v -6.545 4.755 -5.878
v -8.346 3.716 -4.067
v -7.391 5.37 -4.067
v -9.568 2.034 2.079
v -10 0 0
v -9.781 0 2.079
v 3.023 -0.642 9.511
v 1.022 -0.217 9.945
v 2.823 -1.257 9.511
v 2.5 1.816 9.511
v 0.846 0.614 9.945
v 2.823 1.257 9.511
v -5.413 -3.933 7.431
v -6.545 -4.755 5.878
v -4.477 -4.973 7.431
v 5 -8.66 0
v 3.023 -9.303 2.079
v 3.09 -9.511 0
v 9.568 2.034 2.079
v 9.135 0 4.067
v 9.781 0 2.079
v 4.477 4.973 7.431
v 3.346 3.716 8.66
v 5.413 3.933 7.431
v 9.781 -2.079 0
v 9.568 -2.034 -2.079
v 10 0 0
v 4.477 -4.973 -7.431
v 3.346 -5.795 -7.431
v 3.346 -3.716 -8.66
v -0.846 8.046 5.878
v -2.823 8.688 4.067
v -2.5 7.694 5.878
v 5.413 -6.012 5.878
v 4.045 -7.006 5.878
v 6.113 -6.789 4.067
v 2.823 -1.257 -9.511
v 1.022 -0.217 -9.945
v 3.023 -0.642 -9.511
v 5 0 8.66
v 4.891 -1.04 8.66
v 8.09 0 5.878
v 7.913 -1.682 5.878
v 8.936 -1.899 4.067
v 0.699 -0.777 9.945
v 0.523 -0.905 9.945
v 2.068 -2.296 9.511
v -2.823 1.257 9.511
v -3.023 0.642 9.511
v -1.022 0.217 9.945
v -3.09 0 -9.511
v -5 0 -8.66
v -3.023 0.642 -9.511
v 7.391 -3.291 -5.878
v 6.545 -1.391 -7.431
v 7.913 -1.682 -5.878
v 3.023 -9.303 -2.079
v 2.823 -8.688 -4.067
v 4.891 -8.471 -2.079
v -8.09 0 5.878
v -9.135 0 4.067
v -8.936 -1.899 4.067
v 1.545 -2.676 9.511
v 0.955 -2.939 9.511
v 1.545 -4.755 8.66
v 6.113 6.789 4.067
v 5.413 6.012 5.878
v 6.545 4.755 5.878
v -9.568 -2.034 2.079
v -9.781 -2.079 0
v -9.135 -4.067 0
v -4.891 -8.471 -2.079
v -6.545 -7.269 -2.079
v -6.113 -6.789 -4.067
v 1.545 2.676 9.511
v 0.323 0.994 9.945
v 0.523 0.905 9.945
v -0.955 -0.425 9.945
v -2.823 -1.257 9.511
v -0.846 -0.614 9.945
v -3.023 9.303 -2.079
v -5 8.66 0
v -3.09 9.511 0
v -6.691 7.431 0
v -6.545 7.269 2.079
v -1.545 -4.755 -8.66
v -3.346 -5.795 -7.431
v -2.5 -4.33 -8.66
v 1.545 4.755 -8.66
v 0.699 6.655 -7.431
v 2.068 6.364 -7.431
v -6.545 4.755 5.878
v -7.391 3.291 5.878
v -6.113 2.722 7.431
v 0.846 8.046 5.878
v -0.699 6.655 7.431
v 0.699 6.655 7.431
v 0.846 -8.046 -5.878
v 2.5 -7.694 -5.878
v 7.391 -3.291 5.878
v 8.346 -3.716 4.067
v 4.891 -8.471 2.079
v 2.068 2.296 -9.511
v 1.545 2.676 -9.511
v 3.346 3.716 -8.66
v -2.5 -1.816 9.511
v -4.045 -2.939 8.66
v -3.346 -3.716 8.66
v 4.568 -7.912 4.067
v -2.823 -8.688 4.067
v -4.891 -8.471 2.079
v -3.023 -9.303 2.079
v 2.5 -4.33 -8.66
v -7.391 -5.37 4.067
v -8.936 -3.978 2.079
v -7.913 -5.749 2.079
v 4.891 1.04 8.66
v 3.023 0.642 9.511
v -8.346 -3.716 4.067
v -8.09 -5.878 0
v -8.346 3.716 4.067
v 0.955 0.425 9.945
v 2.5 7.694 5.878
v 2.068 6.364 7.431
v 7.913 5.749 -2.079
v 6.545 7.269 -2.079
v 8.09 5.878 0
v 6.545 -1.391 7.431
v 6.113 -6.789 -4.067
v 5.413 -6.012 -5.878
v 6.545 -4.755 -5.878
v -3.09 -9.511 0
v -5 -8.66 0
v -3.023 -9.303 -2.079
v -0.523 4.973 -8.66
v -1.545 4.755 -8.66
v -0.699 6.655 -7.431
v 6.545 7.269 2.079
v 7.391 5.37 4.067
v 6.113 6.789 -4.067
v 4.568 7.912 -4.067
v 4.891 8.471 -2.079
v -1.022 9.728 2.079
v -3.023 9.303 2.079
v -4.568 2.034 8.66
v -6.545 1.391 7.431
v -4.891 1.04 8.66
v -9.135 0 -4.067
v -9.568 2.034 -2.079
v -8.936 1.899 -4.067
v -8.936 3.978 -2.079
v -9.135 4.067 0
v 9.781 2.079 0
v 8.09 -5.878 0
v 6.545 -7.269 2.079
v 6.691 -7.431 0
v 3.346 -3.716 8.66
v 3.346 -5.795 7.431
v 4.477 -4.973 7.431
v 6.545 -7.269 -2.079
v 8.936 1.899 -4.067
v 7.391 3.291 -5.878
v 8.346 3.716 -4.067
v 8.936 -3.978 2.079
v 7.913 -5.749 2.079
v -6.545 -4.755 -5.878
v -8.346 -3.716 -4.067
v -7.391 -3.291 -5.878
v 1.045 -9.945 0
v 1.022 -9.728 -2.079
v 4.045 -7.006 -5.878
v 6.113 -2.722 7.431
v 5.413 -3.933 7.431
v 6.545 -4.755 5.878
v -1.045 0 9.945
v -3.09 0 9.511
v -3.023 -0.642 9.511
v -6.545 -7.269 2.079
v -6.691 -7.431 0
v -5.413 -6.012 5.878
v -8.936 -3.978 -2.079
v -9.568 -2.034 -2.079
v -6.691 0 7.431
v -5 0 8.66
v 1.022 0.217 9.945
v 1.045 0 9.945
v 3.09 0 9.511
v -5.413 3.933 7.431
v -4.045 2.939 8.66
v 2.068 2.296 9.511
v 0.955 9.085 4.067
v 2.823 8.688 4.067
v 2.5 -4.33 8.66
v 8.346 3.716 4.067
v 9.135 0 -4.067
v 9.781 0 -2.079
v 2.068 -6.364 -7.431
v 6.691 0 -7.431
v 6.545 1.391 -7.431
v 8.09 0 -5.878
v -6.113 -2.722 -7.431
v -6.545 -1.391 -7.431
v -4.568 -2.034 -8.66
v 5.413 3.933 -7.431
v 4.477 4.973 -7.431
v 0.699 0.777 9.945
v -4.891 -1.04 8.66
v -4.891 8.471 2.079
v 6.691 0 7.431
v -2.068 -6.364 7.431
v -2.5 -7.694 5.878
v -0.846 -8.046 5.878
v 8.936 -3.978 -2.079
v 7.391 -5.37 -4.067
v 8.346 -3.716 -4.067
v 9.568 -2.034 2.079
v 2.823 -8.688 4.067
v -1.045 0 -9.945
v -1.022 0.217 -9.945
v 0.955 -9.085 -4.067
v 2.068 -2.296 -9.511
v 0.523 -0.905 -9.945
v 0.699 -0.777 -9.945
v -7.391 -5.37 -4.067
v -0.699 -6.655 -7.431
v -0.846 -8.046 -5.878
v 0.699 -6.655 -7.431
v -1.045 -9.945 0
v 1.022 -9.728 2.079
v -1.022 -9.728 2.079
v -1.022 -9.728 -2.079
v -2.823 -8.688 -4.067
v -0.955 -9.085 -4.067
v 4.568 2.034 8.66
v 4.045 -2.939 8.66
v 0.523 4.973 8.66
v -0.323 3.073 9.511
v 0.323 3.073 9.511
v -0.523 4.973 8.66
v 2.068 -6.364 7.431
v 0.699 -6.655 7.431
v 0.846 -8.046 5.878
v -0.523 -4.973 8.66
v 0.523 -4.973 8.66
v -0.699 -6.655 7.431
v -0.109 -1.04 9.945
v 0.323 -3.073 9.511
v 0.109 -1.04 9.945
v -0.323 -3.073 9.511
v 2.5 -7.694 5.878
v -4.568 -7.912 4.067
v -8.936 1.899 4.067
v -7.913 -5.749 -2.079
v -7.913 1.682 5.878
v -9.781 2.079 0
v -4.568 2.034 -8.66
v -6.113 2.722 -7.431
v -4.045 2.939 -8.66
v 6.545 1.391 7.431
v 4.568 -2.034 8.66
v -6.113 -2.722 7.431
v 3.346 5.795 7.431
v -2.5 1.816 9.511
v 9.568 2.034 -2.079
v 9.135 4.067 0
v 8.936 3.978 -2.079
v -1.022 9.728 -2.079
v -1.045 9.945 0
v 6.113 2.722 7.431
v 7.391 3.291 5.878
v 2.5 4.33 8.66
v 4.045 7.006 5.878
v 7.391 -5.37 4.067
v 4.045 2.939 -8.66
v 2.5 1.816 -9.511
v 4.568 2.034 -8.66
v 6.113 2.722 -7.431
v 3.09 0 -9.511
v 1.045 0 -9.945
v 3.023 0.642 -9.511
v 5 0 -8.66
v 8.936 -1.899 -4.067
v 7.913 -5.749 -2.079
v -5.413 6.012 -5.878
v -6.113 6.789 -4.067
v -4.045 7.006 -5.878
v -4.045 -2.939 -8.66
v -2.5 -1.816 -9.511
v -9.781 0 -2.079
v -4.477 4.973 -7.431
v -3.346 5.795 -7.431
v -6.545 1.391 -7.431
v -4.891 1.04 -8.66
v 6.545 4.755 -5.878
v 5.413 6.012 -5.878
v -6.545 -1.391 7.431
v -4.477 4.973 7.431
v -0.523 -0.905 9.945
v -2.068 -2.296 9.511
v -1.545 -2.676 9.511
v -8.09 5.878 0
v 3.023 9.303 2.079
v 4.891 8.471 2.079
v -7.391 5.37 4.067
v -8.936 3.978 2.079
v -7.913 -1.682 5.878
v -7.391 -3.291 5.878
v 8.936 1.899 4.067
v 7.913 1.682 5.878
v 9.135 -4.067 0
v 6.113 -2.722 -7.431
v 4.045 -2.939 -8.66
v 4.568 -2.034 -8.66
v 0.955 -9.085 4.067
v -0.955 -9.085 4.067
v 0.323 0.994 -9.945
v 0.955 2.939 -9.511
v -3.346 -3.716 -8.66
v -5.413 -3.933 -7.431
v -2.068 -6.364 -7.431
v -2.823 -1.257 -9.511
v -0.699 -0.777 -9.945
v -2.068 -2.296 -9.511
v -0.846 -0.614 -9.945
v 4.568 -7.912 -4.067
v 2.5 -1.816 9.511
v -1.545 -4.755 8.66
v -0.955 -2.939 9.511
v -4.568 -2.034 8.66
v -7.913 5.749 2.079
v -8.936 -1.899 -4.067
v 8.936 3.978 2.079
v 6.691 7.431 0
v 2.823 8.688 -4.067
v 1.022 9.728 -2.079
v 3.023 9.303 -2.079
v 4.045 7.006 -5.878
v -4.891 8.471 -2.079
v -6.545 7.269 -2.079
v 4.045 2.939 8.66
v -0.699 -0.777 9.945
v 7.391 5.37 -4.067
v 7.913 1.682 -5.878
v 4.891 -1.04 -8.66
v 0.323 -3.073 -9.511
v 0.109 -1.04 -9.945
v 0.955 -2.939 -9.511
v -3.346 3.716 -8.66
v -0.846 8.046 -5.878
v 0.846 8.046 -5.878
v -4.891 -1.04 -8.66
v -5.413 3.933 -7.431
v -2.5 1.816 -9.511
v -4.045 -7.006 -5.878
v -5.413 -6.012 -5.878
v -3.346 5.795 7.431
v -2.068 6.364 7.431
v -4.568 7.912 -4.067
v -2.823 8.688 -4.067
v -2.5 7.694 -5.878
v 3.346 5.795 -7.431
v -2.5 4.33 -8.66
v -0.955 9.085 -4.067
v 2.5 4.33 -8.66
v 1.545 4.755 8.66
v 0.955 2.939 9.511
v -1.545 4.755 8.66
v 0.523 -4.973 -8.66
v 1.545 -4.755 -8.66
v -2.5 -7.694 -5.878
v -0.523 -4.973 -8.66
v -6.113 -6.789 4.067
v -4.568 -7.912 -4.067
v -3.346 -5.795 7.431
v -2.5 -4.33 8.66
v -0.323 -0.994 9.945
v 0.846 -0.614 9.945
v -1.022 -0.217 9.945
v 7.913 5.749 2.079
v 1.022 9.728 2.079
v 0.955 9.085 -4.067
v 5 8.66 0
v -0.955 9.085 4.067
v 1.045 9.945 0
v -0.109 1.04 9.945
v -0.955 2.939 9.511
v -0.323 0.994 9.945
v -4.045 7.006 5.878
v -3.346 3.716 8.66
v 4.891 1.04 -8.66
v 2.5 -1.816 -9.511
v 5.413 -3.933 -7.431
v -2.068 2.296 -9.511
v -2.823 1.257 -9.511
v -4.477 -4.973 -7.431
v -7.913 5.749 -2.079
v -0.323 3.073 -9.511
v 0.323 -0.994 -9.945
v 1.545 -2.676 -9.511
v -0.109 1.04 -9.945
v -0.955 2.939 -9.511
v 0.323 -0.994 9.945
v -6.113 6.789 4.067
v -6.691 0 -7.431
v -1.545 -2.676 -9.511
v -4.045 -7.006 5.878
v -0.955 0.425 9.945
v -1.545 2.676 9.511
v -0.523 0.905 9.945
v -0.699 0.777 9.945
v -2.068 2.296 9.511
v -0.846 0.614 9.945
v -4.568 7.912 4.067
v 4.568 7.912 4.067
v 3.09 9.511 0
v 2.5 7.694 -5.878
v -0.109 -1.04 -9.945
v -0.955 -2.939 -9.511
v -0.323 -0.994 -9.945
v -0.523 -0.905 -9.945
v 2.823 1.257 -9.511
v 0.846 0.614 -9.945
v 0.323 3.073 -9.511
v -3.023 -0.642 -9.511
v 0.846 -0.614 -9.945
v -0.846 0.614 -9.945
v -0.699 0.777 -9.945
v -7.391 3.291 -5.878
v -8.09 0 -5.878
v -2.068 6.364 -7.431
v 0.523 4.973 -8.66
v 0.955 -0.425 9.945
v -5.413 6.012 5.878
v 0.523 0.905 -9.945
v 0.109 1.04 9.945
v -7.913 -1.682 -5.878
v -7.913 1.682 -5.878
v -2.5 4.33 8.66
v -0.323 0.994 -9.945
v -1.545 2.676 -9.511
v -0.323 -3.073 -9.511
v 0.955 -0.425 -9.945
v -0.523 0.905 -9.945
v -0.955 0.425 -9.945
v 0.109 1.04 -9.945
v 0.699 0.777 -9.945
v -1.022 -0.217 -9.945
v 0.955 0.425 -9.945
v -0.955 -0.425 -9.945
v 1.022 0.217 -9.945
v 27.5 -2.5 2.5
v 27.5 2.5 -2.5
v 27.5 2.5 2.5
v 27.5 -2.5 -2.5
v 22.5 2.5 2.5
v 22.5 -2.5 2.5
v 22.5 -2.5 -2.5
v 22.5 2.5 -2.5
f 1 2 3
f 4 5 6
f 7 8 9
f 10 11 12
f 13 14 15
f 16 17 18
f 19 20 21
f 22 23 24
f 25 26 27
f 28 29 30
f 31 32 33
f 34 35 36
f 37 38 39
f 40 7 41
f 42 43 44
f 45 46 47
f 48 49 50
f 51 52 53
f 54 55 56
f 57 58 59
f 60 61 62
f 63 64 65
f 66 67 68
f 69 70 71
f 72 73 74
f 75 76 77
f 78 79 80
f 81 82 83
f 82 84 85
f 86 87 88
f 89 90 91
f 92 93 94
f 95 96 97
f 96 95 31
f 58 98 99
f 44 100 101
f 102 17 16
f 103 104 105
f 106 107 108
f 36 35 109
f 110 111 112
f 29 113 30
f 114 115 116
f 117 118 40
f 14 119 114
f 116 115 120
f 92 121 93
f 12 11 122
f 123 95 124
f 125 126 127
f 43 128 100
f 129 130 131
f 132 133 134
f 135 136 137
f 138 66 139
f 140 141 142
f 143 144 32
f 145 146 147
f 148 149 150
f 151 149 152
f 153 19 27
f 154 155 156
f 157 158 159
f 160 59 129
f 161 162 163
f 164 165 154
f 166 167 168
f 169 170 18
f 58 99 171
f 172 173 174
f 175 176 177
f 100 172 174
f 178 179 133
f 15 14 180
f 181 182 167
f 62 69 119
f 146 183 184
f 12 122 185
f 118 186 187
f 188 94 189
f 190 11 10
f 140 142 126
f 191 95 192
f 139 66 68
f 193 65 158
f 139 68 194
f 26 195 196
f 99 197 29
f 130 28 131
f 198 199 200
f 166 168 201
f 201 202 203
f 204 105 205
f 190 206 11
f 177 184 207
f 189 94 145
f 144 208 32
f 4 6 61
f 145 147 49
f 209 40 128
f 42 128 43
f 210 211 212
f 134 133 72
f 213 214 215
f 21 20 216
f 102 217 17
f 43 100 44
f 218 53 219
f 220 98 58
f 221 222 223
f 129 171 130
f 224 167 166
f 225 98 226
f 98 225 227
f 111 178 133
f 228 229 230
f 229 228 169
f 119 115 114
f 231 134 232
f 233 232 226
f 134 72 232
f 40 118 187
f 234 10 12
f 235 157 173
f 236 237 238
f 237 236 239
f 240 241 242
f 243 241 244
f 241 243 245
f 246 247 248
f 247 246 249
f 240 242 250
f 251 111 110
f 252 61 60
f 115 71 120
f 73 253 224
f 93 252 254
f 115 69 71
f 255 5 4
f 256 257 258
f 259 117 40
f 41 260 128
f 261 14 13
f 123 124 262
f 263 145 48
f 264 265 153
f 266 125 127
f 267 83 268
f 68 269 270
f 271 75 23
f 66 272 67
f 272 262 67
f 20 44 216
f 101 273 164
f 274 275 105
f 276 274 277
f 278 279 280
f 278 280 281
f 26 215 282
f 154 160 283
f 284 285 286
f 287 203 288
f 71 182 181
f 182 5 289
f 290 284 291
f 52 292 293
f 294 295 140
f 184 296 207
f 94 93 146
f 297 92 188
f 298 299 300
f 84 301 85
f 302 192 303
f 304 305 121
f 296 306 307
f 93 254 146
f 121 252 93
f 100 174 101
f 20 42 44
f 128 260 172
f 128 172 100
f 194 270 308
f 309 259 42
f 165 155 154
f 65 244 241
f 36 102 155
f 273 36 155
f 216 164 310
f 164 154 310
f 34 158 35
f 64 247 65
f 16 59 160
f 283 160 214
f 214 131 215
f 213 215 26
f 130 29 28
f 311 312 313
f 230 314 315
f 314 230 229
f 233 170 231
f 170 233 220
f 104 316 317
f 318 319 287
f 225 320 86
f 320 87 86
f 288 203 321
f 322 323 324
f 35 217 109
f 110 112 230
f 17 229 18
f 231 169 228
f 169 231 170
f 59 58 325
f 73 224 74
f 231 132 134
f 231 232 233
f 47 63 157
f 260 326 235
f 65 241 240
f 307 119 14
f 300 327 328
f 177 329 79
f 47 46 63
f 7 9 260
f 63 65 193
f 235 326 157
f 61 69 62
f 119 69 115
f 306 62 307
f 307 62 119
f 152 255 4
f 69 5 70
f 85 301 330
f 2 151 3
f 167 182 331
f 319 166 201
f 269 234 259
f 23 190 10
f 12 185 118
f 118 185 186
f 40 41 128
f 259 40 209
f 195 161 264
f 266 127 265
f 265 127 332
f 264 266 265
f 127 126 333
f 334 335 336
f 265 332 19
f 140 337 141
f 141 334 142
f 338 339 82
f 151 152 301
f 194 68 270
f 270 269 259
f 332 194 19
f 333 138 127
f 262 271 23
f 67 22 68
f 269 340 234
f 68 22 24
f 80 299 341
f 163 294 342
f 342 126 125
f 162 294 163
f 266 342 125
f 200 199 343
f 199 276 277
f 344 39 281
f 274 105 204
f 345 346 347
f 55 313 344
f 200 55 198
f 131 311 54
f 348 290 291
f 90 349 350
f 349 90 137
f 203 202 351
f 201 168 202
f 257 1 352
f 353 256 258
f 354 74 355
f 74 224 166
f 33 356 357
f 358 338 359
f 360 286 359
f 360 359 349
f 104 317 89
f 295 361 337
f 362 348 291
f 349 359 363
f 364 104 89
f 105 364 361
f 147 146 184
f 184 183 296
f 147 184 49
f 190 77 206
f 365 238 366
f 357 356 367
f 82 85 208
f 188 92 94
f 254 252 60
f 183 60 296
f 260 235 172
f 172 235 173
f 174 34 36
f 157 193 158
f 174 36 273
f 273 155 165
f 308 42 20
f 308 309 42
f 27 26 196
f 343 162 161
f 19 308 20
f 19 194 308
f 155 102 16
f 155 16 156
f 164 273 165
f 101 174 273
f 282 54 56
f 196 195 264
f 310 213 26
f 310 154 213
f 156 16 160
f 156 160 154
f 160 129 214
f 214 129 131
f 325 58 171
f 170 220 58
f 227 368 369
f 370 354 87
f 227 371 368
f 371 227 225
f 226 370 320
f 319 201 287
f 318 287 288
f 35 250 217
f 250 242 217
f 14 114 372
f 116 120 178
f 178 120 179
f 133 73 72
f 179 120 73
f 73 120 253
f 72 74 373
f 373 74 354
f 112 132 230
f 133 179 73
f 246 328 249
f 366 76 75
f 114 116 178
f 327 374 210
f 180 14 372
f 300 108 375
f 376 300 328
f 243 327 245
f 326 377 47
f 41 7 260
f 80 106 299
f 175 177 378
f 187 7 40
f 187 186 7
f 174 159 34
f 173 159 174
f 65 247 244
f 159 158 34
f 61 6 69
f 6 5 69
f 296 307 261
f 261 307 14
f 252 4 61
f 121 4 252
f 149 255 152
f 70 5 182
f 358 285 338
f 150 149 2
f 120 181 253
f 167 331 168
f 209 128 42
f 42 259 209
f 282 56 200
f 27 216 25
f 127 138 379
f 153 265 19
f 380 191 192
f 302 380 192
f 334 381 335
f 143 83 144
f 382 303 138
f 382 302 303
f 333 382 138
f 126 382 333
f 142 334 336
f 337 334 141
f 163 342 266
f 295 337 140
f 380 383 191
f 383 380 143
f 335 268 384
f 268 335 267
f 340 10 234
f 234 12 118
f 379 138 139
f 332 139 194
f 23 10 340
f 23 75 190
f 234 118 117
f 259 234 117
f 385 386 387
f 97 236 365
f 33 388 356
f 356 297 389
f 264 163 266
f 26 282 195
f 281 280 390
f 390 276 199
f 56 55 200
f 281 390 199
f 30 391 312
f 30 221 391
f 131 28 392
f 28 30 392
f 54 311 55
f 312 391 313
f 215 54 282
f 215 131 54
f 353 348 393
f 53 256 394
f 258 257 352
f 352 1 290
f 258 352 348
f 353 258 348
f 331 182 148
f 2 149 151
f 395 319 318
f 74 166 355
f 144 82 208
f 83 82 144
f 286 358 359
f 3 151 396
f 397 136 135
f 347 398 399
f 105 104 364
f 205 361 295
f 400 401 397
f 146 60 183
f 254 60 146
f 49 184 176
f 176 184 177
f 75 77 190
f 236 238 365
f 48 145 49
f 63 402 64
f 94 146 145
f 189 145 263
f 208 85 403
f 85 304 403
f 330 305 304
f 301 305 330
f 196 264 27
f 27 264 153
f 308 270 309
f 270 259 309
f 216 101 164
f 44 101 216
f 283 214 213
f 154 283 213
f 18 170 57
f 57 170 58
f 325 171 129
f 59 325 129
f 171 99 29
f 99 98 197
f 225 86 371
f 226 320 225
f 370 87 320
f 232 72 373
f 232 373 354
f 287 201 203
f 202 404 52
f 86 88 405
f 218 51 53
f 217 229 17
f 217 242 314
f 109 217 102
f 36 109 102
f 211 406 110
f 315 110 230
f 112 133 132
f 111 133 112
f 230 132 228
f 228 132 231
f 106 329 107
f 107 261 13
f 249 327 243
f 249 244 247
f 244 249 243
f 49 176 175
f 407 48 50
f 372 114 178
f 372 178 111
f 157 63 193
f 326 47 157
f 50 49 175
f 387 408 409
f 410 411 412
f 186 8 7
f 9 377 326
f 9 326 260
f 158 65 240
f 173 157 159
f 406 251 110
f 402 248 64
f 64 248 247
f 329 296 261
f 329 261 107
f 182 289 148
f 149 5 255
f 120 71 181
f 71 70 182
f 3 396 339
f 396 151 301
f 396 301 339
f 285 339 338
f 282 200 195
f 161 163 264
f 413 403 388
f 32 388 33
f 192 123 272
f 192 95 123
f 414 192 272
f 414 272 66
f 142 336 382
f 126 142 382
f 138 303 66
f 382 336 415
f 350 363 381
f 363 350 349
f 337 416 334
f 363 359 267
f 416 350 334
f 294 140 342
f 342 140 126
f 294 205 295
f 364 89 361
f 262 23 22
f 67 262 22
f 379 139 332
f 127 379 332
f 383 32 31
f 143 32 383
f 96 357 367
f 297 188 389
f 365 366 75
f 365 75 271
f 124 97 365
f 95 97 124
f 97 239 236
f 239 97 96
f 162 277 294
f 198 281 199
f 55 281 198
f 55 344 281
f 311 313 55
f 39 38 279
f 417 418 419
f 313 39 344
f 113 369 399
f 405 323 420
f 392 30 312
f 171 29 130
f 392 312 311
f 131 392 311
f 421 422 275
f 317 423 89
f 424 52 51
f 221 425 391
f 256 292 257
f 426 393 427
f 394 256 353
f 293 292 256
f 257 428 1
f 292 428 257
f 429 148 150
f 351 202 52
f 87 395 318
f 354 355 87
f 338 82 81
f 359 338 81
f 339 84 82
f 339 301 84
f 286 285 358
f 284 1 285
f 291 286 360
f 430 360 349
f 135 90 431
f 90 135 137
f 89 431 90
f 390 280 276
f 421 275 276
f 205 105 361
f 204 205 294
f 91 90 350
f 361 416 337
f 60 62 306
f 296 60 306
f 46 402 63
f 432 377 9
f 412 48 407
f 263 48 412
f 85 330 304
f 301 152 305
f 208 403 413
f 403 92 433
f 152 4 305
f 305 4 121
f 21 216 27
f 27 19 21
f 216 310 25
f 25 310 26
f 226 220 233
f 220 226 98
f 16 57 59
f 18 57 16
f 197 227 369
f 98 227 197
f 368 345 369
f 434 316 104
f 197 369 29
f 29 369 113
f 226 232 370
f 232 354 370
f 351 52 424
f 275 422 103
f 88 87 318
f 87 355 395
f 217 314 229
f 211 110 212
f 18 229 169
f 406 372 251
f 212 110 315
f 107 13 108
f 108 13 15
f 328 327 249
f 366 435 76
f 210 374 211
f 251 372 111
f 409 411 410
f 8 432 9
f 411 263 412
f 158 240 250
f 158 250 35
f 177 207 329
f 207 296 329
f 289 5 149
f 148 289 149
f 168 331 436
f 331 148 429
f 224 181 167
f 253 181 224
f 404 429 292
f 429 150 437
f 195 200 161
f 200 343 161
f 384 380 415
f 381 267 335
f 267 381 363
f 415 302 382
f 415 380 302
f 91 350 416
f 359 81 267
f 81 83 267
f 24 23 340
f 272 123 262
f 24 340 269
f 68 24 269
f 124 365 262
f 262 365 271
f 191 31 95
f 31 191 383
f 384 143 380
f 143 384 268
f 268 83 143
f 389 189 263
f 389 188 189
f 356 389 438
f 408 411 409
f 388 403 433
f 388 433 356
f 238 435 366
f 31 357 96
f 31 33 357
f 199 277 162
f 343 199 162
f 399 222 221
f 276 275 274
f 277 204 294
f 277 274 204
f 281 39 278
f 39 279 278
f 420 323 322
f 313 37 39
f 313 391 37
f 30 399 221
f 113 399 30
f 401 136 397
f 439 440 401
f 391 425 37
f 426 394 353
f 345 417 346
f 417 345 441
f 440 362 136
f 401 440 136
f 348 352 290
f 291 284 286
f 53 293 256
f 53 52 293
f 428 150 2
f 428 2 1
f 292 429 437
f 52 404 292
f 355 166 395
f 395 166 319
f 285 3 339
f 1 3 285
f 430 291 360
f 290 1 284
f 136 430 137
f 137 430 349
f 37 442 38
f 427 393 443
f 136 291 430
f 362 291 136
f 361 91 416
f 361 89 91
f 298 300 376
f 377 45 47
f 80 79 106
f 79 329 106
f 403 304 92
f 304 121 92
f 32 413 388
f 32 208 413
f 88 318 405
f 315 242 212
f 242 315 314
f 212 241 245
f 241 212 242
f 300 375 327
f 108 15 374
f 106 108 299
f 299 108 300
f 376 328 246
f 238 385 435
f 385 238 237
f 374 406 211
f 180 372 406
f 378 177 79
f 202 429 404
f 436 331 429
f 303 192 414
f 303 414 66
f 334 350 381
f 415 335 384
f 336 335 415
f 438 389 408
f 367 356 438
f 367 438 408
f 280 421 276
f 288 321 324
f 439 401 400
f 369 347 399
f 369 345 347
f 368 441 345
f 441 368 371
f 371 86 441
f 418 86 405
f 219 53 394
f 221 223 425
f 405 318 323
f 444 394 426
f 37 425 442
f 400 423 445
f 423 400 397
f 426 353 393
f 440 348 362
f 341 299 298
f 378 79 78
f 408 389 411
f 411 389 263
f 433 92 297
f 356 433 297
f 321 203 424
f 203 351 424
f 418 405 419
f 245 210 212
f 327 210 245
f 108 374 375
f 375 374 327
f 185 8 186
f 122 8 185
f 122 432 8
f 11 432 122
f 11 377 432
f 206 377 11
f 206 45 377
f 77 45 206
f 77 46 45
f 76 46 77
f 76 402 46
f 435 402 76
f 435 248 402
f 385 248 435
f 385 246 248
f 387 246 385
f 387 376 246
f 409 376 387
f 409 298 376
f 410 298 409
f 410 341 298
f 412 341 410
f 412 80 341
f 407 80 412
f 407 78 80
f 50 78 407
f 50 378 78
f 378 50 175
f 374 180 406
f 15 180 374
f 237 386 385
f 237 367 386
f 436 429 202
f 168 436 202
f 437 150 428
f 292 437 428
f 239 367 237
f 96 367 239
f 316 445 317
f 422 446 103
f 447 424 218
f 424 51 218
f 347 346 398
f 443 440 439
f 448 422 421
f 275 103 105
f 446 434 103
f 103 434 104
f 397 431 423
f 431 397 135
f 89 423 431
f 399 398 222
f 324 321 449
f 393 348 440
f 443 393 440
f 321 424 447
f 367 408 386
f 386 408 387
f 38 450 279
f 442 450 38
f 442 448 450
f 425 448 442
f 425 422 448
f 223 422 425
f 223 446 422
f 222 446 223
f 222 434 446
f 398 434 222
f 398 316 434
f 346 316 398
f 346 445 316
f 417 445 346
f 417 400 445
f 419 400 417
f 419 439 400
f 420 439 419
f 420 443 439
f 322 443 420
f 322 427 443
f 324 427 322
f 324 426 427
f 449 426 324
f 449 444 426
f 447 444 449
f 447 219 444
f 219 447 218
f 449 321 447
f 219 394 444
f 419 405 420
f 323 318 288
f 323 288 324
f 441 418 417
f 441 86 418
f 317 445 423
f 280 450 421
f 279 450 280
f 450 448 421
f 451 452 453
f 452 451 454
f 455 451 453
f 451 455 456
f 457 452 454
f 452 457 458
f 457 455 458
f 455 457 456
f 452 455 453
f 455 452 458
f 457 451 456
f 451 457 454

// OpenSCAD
// Volume: 4237.861654538725, SurfaceArea: 1395.2051191189146
difference() {
  sphere(r=10);
  %cylinder(h=30, r=6, center=true);
}
%if (true) cube([25,6,3], center=true);

%translate([0,-9,0]) difference() {
  color("green") cube([10,4,10], center=true);
  color("red") translate([0,-2,0]) sphere(3);
}

// Test modifiers work with minkowski children
translate([25,0,0]) minkowski() {
      %cube(10, center=true);
      cube(5, center=true);
}
